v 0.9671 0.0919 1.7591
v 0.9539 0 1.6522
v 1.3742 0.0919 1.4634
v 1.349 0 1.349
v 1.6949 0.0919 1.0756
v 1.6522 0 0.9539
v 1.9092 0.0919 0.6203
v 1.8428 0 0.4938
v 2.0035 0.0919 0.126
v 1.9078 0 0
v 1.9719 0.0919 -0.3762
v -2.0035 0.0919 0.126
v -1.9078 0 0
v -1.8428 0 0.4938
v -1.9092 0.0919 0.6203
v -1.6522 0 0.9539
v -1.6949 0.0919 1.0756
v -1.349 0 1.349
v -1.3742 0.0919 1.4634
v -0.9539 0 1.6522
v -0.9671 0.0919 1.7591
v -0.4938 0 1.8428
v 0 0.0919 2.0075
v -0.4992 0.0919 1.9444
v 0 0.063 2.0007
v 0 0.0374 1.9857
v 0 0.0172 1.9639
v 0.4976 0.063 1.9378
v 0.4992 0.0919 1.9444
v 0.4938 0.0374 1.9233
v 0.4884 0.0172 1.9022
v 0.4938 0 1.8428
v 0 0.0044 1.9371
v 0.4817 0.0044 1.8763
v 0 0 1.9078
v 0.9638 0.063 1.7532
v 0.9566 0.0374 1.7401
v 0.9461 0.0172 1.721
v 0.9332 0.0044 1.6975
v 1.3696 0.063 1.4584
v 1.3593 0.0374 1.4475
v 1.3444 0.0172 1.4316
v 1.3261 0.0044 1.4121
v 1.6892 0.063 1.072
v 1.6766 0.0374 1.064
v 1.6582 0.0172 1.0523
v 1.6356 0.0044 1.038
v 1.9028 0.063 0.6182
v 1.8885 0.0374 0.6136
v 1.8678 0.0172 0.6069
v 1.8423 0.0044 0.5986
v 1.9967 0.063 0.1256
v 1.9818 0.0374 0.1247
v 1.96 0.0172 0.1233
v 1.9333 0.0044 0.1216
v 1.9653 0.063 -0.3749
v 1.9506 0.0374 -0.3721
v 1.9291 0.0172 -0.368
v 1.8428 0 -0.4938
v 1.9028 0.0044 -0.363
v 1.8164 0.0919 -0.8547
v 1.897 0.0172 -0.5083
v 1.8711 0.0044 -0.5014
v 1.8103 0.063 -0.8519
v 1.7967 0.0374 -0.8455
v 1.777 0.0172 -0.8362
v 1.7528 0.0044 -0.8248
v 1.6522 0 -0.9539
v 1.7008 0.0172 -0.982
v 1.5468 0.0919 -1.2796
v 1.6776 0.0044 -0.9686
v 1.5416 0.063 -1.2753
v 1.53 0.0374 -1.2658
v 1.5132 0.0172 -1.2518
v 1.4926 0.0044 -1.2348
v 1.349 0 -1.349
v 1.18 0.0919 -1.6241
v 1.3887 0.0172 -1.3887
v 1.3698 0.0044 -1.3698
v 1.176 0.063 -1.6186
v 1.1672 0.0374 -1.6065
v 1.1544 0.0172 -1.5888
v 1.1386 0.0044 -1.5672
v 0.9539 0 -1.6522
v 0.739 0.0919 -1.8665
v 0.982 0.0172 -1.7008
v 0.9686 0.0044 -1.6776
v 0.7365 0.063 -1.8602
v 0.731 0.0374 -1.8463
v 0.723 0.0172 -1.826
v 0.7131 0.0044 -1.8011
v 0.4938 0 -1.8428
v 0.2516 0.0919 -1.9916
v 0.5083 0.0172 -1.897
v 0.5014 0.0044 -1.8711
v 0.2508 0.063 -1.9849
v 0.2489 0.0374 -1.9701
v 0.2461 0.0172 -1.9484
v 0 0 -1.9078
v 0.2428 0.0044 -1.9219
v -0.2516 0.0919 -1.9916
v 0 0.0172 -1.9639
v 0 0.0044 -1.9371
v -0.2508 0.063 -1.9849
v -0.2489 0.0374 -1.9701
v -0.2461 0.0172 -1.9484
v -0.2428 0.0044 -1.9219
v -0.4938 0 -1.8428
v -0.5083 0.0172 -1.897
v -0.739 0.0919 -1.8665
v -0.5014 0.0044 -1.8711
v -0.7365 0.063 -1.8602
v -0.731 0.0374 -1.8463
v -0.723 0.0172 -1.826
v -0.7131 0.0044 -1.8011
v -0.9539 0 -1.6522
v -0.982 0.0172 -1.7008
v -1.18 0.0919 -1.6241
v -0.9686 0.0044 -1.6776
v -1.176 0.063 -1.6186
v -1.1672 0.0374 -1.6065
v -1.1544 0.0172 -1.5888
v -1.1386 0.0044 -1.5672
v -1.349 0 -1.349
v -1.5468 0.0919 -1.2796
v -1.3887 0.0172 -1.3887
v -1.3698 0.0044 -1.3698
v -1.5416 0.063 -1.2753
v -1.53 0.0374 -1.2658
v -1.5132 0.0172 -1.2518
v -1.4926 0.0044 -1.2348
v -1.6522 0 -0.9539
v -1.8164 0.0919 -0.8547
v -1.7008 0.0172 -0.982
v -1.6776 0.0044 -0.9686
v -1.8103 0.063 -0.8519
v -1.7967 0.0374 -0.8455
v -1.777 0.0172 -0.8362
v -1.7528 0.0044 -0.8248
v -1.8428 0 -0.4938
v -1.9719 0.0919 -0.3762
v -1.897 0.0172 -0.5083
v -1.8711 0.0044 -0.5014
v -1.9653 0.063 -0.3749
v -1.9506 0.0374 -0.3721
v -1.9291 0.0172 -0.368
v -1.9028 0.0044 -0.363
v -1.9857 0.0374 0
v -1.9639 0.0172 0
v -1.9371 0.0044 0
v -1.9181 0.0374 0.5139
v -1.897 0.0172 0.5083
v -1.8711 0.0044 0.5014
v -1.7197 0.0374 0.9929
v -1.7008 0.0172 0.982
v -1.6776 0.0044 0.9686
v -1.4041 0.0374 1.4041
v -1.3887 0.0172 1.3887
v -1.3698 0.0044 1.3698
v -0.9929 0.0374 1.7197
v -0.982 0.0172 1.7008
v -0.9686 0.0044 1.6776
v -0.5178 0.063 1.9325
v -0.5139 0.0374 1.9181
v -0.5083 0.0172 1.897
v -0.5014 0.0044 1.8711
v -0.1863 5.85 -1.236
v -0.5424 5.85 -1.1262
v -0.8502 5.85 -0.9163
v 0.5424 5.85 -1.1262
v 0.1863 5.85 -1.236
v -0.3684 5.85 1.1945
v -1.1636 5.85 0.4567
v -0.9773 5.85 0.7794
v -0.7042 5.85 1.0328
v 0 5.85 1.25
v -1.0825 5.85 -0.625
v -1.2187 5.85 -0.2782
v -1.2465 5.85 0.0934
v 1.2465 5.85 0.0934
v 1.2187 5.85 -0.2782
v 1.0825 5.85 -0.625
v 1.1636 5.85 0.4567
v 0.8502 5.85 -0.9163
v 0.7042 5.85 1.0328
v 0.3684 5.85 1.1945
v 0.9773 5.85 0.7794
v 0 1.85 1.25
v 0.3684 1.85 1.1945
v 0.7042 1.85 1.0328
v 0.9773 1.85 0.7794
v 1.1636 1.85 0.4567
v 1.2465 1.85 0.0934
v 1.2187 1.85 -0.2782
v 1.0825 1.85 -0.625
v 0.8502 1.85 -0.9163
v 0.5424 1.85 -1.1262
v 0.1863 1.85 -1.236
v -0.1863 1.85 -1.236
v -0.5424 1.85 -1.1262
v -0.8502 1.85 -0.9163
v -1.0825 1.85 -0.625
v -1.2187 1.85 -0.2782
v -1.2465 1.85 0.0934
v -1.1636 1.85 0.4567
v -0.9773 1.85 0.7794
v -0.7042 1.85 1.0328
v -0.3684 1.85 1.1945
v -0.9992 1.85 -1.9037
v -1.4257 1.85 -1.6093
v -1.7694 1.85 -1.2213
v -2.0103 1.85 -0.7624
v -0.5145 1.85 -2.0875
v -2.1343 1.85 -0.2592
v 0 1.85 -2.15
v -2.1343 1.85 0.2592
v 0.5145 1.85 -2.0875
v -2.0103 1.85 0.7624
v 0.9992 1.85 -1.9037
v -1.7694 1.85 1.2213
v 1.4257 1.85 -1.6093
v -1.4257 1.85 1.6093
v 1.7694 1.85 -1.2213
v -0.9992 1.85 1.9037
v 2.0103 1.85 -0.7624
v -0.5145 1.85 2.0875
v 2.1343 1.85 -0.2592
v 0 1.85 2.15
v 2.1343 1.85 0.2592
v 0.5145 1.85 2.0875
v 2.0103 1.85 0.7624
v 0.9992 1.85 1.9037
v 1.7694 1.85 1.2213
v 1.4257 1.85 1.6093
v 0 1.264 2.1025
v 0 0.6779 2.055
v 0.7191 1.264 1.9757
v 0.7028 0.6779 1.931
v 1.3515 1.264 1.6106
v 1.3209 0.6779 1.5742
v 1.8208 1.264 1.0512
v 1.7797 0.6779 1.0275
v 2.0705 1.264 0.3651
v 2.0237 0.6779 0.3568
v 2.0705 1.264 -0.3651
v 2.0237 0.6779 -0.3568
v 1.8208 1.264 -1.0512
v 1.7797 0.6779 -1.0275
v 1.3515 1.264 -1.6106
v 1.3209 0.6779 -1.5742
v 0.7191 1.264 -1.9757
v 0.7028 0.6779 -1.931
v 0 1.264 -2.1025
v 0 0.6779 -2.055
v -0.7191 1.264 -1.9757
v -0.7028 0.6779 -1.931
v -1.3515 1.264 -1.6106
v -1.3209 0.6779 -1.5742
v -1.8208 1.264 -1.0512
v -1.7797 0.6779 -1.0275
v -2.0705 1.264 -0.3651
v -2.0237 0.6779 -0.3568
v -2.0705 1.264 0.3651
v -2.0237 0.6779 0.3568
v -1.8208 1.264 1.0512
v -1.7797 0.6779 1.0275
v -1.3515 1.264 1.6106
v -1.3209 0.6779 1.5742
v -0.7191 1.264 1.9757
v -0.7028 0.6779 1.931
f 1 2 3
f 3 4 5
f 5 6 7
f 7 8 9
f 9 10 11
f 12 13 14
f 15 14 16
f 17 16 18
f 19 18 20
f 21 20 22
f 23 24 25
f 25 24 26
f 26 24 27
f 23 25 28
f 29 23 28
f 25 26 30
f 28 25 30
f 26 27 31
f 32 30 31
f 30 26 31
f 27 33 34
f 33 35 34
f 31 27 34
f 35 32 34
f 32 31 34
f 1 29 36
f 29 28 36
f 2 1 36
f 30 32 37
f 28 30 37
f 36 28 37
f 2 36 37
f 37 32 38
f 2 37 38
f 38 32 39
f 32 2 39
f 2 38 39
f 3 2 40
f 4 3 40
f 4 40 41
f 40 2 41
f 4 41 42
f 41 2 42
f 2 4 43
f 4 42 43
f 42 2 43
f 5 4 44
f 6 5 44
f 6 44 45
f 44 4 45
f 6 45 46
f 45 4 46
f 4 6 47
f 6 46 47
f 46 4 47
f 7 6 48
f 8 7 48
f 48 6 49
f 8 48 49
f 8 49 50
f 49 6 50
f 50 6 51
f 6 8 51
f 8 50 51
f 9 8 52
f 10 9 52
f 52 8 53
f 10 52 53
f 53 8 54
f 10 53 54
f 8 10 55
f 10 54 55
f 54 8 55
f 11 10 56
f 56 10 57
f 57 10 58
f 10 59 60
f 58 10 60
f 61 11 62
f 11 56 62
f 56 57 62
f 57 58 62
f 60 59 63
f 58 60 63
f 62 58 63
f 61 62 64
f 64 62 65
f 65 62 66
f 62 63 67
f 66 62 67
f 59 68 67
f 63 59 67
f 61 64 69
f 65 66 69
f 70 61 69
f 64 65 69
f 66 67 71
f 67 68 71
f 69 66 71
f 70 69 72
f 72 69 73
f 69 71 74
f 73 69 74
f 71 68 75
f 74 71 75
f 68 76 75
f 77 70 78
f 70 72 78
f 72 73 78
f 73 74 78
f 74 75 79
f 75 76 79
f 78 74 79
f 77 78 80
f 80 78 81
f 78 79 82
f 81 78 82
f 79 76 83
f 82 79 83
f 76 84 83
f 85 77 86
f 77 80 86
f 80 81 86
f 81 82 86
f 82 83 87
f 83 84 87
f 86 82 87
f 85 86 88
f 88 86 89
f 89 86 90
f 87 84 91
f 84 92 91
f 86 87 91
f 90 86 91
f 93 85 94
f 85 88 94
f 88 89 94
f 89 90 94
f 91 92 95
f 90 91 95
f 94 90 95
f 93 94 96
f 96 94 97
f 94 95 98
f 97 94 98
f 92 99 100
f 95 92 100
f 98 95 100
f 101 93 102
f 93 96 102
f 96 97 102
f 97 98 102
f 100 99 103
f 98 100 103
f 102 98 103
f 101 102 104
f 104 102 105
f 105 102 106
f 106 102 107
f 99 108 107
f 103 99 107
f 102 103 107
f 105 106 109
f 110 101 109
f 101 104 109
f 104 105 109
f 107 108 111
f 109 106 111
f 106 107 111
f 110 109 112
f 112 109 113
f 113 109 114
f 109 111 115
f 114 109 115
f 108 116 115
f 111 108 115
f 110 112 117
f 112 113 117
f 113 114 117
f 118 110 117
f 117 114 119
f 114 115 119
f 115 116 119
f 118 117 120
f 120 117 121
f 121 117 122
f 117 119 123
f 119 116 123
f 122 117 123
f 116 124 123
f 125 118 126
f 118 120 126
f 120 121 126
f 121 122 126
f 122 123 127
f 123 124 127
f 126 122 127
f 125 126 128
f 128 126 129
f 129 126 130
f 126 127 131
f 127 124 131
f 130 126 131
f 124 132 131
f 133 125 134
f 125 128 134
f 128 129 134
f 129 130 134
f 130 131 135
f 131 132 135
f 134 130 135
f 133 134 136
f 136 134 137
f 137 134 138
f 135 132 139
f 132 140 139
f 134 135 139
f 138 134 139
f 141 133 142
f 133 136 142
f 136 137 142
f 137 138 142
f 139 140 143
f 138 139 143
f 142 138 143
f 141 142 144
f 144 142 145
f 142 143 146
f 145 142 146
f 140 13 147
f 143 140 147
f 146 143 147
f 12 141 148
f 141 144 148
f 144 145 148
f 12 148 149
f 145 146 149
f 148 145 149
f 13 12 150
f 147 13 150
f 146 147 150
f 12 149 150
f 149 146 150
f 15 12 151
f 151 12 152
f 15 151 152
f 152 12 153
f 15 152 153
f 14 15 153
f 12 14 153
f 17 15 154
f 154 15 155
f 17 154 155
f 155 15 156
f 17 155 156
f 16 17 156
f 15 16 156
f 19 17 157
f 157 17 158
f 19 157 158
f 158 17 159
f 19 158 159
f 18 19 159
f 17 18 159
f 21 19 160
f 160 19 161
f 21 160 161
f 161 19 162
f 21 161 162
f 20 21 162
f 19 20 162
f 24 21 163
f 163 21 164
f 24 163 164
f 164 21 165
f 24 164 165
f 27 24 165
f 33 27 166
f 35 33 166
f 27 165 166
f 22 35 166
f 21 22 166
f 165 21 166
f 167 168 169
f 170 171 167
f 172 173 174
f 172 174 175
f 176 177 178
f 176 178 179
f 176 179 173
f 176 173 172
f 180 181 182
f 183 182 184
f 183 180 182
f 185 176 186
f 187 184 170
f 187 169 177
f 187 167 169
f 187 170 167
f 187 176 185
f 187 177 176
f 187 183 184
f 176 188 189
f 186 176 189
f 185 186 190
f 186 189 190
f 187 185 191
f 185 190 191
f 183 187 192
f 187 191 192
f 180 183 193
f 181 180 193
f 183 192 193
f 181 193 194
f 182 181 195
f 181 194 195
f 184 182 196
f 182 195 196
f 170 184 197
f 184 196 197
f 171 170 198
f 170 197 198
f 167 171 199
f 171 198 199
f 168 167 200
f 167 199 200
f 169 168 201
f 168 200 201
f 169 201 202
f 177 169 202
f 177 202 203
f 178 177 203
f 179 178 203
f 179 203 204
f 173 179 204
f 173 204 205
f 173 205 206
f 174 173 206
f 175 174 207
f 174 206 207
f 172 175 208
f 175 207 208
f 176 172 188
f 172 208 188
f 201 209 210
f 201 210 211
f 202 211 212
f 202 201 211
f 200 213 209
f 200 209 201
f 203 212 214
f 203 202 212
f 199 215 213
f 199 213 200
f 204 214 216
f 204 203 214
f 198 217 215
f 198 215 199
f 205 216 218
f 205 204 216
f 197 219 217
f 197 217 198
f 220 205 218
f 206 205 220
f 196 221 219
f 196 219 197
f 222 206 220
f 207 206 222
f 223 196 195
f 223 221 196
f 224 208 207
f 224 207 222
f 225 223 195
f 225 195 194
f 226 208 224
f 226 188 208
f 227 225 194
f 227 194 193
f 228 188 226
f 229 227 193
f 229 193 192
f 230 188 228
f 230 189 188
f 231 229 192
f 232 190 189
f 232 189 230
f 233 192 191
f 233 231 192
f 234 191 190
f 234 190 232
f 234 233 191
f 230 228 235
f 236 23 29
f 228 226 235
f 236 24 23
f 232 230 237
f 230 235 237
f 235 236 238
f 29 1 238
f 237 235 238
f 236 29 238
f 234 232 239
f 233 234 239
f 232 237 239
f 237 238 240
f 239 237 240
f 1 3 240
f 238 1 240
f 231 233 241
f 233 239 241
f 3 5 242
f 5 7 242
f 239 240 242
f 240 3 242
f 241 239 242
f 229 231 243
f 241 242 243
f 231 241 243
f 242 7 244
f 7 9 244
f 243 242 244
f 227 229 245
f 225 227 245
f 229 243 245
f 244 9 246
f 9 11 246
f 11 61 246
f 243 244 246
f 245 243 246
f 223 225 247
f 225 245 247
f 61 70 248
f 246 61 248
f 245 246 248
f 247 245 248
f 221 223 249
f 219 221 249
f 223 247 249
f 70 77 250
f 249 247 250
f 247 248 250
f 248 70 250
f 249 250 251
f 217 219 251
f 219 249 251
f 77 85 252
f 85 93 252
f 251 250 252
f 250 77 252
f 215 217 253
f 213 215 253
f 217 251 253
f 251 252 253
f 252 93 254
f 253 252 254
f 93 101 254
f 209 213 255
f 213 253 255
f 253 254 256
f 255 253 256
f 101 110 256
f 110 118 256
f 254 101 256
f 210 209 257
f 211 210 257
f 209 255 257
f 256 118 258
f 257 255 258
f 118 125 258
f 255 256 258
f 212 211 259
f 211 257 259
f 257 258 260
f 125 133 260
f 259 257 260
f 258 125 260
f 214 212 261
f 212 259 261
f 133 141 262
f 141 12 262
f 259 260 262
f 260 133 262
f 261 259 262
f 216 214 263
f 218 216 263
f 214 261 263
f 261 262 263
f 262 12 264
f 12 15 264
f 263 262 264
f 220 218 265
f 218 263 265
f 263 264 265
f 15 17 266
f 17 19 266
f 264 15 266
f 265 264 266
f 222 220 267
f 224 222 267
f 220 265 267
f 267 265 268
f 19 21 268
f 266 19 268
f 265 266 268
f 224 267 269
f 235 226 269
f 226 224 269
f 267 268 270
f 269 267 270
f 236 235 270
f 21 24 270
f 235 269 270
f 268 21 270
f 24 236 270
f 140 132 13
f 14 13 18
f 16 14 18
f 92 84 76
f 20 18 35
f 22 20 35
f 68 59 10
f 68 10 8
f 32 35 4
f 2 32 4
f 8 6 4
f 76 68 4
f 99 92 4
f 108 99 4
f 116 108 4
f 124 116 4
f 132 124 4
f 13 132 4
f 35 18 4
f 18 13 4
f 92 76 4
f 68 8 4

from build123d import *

# Parameters (mm, degrees)
ESQUISSE1_R        = 2.15
BOSS_EXTRU_1_DEPTH = 1.85
ESQUISSE2_R        = 1.25
BOSS_EXTRU_2_DEPTH = 4
CHANFREIN1_SIZE    = 1.85
CHANFREIN1_SIZE_2  = 0.15
CONG_1_R           = 0.1


with BuildPart() as part:
    # Esquisse1 → Boss.-Extru.1 (new body)
    with BuildSketch(Plane(origin=(0, 0, 0), x_dir=(1, 0, 0), z_dir=(0, 1, 0))):
        with Locations(Location((0, 0, 0), (0, 0, 270))):
            Circle(ESQUISSE1_R)
    extrude(amount=BOSS_EXTRU_1_DEPTH)

    # Esquisse2 → Boss.-Extru.2 (add)
    with BuildSketch(Plane(origin=(0, 1.85, 0), x_dir=(1, 0, 0), z_dir=(0, 1, 0))):
        with Locations(Location((0, 0, 0), (0, 0, 270))):
            Circle(ESQUISSE2_R)
    extrude(amount=BOSS_EXTRU_2_DEPTH)

    # Chanfrein1
    # the kernel refuses this chamfer: 1.85, 0.15 mm, written as the material it takes off along each edge
    with BuildSketch(Plane(origin=(0, 0, 0), x_dir=(0, 0, 1), z_dir=(-1, 0, 0))) as chanfrein1_piece_1:
        Polygon((2.15, CHANFREIN1_SIZE), (2.15 - CHANFREIN1_SIZE_2, 0), (2.15, 0), align=None)
    revolve(axis=Axis((0, 0, 0), (0, 1, 0)), mode=Mode.SUBTRACT)

    # Congé1
    cong_1_edges = [part.edges().sort_by_distance(p)[0] for p in [
        (0, 0, -2),
    ]]
    fillet(cong_1_edges, radius=CONG_1_R)


solid = part.part
